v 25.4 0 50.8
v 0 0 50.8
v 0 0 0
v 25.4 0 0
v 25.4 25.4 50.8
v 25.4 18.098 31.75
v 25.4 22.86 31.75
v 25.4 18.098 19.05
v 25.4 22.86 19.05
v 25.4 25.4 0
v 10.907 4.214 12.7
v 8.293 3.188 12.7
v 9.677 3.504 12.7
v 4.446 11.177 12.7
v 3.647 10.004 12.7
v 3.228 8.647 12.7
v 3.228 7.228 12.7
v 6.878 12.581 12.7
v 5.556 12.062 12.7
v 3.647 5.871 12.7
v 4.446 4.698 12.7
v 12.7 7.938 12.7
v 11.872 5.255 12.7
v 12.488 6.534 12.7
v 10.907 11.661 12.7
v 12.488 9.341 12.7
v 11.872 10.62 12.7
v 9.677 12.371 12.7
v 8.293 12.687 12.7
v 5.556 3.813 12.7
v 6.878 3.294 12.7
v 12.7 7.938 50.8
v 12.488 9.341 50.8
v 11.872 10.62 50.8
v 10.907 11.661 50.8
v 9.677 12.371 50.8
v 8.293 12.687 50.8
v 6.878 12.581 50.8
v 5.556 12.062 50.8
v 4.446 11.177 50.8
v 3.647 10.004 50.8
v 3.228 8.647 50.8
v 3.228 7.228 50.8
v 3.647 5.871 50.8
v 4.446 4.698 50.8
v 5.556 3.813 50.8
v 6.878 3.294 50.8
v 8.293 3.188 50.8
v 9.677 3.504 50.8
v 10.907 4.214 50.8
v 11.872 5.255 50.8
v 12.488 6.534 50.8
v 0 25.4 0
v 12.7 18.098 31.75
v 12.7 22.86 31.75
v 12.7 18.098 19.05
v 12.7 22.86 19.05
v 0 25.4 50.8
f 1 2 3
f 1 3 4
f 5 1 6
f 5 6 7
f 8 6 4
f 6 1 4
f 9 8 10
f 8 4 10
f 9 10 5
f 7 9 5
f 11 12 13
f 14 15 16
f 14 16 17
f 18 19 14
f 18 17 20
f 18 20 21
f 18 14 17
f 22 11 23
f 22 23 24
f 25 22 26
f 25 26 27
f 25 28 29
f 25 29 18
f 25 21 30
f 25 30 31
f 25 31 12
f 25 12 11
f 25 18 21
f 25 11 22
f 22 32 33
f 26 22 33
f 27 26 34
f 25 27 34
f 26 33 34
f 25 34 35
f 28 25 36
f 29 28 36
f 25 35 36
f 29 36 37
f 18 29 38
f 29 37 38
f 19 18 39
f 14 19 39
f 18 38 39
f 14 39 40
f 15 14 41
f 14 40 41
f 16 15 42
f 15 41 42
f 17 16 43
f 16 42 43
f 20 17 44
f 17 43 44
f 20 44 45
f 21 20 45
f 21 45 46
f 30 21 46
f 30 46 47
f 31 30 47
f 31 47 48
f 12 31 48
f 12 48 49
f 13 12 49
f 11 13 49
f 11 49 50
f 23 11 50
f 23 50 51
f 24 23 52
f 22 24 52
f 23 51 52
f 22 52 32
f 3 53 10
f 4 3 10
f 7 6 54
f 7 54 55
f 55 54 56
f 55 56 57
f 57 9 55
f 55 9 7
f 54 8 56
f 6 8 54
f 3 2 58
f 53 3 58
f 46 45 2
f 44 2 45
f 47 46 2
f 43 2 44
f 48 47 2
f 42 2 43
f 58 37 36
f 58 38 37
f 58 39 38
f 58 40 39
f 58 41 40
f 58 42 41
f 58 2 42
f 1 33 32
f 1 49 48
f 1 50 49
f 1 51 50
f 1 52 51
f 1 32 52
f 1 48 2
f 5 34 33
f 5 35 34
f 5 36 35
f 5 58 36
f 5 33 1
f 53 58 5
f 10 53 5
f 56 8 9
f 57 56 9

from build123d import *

# Parameters (mm, degrees)
F0_W     = 25.4
F0_H     = 25.4
F1_DEPTH = 50.8
F2_R     = 4.7625
F3_DEPTH = 38.1
F4_W     = 4.7625
F4_H     = 12.7
F5_DEPTH = 12.7


with BuildPart() as f1:
    # F0 (on Top) → F1 (new body)
    with BuildSketch(Plane.XY):
        with Locations((12.7, 12.7)):
            Rectangle(F0_W, F0_H)
    extrude(amount=F1_DEPTH)

    # F2 (on face) → F3 (cut)
    with BuildSketch(Plane.XY.offset(50.8)):
        with Locations((7.9375, 7.9375)):
            Circle(F2_R)
    extrude(amount=-F3_DEPTH, mode=Mode.SUBTRACT)

    # F4 (on face) → F5 (cut)
    with BuildSketch(Plane.YZ.offset(25.4)):
        with Locations((20.47875, 25.4)):
            Rectangle(F4_W, F4_H)
    extrude(amount=-F5_DEPTH, mode=Mode.SUBTRACT)


solid = f1.part
